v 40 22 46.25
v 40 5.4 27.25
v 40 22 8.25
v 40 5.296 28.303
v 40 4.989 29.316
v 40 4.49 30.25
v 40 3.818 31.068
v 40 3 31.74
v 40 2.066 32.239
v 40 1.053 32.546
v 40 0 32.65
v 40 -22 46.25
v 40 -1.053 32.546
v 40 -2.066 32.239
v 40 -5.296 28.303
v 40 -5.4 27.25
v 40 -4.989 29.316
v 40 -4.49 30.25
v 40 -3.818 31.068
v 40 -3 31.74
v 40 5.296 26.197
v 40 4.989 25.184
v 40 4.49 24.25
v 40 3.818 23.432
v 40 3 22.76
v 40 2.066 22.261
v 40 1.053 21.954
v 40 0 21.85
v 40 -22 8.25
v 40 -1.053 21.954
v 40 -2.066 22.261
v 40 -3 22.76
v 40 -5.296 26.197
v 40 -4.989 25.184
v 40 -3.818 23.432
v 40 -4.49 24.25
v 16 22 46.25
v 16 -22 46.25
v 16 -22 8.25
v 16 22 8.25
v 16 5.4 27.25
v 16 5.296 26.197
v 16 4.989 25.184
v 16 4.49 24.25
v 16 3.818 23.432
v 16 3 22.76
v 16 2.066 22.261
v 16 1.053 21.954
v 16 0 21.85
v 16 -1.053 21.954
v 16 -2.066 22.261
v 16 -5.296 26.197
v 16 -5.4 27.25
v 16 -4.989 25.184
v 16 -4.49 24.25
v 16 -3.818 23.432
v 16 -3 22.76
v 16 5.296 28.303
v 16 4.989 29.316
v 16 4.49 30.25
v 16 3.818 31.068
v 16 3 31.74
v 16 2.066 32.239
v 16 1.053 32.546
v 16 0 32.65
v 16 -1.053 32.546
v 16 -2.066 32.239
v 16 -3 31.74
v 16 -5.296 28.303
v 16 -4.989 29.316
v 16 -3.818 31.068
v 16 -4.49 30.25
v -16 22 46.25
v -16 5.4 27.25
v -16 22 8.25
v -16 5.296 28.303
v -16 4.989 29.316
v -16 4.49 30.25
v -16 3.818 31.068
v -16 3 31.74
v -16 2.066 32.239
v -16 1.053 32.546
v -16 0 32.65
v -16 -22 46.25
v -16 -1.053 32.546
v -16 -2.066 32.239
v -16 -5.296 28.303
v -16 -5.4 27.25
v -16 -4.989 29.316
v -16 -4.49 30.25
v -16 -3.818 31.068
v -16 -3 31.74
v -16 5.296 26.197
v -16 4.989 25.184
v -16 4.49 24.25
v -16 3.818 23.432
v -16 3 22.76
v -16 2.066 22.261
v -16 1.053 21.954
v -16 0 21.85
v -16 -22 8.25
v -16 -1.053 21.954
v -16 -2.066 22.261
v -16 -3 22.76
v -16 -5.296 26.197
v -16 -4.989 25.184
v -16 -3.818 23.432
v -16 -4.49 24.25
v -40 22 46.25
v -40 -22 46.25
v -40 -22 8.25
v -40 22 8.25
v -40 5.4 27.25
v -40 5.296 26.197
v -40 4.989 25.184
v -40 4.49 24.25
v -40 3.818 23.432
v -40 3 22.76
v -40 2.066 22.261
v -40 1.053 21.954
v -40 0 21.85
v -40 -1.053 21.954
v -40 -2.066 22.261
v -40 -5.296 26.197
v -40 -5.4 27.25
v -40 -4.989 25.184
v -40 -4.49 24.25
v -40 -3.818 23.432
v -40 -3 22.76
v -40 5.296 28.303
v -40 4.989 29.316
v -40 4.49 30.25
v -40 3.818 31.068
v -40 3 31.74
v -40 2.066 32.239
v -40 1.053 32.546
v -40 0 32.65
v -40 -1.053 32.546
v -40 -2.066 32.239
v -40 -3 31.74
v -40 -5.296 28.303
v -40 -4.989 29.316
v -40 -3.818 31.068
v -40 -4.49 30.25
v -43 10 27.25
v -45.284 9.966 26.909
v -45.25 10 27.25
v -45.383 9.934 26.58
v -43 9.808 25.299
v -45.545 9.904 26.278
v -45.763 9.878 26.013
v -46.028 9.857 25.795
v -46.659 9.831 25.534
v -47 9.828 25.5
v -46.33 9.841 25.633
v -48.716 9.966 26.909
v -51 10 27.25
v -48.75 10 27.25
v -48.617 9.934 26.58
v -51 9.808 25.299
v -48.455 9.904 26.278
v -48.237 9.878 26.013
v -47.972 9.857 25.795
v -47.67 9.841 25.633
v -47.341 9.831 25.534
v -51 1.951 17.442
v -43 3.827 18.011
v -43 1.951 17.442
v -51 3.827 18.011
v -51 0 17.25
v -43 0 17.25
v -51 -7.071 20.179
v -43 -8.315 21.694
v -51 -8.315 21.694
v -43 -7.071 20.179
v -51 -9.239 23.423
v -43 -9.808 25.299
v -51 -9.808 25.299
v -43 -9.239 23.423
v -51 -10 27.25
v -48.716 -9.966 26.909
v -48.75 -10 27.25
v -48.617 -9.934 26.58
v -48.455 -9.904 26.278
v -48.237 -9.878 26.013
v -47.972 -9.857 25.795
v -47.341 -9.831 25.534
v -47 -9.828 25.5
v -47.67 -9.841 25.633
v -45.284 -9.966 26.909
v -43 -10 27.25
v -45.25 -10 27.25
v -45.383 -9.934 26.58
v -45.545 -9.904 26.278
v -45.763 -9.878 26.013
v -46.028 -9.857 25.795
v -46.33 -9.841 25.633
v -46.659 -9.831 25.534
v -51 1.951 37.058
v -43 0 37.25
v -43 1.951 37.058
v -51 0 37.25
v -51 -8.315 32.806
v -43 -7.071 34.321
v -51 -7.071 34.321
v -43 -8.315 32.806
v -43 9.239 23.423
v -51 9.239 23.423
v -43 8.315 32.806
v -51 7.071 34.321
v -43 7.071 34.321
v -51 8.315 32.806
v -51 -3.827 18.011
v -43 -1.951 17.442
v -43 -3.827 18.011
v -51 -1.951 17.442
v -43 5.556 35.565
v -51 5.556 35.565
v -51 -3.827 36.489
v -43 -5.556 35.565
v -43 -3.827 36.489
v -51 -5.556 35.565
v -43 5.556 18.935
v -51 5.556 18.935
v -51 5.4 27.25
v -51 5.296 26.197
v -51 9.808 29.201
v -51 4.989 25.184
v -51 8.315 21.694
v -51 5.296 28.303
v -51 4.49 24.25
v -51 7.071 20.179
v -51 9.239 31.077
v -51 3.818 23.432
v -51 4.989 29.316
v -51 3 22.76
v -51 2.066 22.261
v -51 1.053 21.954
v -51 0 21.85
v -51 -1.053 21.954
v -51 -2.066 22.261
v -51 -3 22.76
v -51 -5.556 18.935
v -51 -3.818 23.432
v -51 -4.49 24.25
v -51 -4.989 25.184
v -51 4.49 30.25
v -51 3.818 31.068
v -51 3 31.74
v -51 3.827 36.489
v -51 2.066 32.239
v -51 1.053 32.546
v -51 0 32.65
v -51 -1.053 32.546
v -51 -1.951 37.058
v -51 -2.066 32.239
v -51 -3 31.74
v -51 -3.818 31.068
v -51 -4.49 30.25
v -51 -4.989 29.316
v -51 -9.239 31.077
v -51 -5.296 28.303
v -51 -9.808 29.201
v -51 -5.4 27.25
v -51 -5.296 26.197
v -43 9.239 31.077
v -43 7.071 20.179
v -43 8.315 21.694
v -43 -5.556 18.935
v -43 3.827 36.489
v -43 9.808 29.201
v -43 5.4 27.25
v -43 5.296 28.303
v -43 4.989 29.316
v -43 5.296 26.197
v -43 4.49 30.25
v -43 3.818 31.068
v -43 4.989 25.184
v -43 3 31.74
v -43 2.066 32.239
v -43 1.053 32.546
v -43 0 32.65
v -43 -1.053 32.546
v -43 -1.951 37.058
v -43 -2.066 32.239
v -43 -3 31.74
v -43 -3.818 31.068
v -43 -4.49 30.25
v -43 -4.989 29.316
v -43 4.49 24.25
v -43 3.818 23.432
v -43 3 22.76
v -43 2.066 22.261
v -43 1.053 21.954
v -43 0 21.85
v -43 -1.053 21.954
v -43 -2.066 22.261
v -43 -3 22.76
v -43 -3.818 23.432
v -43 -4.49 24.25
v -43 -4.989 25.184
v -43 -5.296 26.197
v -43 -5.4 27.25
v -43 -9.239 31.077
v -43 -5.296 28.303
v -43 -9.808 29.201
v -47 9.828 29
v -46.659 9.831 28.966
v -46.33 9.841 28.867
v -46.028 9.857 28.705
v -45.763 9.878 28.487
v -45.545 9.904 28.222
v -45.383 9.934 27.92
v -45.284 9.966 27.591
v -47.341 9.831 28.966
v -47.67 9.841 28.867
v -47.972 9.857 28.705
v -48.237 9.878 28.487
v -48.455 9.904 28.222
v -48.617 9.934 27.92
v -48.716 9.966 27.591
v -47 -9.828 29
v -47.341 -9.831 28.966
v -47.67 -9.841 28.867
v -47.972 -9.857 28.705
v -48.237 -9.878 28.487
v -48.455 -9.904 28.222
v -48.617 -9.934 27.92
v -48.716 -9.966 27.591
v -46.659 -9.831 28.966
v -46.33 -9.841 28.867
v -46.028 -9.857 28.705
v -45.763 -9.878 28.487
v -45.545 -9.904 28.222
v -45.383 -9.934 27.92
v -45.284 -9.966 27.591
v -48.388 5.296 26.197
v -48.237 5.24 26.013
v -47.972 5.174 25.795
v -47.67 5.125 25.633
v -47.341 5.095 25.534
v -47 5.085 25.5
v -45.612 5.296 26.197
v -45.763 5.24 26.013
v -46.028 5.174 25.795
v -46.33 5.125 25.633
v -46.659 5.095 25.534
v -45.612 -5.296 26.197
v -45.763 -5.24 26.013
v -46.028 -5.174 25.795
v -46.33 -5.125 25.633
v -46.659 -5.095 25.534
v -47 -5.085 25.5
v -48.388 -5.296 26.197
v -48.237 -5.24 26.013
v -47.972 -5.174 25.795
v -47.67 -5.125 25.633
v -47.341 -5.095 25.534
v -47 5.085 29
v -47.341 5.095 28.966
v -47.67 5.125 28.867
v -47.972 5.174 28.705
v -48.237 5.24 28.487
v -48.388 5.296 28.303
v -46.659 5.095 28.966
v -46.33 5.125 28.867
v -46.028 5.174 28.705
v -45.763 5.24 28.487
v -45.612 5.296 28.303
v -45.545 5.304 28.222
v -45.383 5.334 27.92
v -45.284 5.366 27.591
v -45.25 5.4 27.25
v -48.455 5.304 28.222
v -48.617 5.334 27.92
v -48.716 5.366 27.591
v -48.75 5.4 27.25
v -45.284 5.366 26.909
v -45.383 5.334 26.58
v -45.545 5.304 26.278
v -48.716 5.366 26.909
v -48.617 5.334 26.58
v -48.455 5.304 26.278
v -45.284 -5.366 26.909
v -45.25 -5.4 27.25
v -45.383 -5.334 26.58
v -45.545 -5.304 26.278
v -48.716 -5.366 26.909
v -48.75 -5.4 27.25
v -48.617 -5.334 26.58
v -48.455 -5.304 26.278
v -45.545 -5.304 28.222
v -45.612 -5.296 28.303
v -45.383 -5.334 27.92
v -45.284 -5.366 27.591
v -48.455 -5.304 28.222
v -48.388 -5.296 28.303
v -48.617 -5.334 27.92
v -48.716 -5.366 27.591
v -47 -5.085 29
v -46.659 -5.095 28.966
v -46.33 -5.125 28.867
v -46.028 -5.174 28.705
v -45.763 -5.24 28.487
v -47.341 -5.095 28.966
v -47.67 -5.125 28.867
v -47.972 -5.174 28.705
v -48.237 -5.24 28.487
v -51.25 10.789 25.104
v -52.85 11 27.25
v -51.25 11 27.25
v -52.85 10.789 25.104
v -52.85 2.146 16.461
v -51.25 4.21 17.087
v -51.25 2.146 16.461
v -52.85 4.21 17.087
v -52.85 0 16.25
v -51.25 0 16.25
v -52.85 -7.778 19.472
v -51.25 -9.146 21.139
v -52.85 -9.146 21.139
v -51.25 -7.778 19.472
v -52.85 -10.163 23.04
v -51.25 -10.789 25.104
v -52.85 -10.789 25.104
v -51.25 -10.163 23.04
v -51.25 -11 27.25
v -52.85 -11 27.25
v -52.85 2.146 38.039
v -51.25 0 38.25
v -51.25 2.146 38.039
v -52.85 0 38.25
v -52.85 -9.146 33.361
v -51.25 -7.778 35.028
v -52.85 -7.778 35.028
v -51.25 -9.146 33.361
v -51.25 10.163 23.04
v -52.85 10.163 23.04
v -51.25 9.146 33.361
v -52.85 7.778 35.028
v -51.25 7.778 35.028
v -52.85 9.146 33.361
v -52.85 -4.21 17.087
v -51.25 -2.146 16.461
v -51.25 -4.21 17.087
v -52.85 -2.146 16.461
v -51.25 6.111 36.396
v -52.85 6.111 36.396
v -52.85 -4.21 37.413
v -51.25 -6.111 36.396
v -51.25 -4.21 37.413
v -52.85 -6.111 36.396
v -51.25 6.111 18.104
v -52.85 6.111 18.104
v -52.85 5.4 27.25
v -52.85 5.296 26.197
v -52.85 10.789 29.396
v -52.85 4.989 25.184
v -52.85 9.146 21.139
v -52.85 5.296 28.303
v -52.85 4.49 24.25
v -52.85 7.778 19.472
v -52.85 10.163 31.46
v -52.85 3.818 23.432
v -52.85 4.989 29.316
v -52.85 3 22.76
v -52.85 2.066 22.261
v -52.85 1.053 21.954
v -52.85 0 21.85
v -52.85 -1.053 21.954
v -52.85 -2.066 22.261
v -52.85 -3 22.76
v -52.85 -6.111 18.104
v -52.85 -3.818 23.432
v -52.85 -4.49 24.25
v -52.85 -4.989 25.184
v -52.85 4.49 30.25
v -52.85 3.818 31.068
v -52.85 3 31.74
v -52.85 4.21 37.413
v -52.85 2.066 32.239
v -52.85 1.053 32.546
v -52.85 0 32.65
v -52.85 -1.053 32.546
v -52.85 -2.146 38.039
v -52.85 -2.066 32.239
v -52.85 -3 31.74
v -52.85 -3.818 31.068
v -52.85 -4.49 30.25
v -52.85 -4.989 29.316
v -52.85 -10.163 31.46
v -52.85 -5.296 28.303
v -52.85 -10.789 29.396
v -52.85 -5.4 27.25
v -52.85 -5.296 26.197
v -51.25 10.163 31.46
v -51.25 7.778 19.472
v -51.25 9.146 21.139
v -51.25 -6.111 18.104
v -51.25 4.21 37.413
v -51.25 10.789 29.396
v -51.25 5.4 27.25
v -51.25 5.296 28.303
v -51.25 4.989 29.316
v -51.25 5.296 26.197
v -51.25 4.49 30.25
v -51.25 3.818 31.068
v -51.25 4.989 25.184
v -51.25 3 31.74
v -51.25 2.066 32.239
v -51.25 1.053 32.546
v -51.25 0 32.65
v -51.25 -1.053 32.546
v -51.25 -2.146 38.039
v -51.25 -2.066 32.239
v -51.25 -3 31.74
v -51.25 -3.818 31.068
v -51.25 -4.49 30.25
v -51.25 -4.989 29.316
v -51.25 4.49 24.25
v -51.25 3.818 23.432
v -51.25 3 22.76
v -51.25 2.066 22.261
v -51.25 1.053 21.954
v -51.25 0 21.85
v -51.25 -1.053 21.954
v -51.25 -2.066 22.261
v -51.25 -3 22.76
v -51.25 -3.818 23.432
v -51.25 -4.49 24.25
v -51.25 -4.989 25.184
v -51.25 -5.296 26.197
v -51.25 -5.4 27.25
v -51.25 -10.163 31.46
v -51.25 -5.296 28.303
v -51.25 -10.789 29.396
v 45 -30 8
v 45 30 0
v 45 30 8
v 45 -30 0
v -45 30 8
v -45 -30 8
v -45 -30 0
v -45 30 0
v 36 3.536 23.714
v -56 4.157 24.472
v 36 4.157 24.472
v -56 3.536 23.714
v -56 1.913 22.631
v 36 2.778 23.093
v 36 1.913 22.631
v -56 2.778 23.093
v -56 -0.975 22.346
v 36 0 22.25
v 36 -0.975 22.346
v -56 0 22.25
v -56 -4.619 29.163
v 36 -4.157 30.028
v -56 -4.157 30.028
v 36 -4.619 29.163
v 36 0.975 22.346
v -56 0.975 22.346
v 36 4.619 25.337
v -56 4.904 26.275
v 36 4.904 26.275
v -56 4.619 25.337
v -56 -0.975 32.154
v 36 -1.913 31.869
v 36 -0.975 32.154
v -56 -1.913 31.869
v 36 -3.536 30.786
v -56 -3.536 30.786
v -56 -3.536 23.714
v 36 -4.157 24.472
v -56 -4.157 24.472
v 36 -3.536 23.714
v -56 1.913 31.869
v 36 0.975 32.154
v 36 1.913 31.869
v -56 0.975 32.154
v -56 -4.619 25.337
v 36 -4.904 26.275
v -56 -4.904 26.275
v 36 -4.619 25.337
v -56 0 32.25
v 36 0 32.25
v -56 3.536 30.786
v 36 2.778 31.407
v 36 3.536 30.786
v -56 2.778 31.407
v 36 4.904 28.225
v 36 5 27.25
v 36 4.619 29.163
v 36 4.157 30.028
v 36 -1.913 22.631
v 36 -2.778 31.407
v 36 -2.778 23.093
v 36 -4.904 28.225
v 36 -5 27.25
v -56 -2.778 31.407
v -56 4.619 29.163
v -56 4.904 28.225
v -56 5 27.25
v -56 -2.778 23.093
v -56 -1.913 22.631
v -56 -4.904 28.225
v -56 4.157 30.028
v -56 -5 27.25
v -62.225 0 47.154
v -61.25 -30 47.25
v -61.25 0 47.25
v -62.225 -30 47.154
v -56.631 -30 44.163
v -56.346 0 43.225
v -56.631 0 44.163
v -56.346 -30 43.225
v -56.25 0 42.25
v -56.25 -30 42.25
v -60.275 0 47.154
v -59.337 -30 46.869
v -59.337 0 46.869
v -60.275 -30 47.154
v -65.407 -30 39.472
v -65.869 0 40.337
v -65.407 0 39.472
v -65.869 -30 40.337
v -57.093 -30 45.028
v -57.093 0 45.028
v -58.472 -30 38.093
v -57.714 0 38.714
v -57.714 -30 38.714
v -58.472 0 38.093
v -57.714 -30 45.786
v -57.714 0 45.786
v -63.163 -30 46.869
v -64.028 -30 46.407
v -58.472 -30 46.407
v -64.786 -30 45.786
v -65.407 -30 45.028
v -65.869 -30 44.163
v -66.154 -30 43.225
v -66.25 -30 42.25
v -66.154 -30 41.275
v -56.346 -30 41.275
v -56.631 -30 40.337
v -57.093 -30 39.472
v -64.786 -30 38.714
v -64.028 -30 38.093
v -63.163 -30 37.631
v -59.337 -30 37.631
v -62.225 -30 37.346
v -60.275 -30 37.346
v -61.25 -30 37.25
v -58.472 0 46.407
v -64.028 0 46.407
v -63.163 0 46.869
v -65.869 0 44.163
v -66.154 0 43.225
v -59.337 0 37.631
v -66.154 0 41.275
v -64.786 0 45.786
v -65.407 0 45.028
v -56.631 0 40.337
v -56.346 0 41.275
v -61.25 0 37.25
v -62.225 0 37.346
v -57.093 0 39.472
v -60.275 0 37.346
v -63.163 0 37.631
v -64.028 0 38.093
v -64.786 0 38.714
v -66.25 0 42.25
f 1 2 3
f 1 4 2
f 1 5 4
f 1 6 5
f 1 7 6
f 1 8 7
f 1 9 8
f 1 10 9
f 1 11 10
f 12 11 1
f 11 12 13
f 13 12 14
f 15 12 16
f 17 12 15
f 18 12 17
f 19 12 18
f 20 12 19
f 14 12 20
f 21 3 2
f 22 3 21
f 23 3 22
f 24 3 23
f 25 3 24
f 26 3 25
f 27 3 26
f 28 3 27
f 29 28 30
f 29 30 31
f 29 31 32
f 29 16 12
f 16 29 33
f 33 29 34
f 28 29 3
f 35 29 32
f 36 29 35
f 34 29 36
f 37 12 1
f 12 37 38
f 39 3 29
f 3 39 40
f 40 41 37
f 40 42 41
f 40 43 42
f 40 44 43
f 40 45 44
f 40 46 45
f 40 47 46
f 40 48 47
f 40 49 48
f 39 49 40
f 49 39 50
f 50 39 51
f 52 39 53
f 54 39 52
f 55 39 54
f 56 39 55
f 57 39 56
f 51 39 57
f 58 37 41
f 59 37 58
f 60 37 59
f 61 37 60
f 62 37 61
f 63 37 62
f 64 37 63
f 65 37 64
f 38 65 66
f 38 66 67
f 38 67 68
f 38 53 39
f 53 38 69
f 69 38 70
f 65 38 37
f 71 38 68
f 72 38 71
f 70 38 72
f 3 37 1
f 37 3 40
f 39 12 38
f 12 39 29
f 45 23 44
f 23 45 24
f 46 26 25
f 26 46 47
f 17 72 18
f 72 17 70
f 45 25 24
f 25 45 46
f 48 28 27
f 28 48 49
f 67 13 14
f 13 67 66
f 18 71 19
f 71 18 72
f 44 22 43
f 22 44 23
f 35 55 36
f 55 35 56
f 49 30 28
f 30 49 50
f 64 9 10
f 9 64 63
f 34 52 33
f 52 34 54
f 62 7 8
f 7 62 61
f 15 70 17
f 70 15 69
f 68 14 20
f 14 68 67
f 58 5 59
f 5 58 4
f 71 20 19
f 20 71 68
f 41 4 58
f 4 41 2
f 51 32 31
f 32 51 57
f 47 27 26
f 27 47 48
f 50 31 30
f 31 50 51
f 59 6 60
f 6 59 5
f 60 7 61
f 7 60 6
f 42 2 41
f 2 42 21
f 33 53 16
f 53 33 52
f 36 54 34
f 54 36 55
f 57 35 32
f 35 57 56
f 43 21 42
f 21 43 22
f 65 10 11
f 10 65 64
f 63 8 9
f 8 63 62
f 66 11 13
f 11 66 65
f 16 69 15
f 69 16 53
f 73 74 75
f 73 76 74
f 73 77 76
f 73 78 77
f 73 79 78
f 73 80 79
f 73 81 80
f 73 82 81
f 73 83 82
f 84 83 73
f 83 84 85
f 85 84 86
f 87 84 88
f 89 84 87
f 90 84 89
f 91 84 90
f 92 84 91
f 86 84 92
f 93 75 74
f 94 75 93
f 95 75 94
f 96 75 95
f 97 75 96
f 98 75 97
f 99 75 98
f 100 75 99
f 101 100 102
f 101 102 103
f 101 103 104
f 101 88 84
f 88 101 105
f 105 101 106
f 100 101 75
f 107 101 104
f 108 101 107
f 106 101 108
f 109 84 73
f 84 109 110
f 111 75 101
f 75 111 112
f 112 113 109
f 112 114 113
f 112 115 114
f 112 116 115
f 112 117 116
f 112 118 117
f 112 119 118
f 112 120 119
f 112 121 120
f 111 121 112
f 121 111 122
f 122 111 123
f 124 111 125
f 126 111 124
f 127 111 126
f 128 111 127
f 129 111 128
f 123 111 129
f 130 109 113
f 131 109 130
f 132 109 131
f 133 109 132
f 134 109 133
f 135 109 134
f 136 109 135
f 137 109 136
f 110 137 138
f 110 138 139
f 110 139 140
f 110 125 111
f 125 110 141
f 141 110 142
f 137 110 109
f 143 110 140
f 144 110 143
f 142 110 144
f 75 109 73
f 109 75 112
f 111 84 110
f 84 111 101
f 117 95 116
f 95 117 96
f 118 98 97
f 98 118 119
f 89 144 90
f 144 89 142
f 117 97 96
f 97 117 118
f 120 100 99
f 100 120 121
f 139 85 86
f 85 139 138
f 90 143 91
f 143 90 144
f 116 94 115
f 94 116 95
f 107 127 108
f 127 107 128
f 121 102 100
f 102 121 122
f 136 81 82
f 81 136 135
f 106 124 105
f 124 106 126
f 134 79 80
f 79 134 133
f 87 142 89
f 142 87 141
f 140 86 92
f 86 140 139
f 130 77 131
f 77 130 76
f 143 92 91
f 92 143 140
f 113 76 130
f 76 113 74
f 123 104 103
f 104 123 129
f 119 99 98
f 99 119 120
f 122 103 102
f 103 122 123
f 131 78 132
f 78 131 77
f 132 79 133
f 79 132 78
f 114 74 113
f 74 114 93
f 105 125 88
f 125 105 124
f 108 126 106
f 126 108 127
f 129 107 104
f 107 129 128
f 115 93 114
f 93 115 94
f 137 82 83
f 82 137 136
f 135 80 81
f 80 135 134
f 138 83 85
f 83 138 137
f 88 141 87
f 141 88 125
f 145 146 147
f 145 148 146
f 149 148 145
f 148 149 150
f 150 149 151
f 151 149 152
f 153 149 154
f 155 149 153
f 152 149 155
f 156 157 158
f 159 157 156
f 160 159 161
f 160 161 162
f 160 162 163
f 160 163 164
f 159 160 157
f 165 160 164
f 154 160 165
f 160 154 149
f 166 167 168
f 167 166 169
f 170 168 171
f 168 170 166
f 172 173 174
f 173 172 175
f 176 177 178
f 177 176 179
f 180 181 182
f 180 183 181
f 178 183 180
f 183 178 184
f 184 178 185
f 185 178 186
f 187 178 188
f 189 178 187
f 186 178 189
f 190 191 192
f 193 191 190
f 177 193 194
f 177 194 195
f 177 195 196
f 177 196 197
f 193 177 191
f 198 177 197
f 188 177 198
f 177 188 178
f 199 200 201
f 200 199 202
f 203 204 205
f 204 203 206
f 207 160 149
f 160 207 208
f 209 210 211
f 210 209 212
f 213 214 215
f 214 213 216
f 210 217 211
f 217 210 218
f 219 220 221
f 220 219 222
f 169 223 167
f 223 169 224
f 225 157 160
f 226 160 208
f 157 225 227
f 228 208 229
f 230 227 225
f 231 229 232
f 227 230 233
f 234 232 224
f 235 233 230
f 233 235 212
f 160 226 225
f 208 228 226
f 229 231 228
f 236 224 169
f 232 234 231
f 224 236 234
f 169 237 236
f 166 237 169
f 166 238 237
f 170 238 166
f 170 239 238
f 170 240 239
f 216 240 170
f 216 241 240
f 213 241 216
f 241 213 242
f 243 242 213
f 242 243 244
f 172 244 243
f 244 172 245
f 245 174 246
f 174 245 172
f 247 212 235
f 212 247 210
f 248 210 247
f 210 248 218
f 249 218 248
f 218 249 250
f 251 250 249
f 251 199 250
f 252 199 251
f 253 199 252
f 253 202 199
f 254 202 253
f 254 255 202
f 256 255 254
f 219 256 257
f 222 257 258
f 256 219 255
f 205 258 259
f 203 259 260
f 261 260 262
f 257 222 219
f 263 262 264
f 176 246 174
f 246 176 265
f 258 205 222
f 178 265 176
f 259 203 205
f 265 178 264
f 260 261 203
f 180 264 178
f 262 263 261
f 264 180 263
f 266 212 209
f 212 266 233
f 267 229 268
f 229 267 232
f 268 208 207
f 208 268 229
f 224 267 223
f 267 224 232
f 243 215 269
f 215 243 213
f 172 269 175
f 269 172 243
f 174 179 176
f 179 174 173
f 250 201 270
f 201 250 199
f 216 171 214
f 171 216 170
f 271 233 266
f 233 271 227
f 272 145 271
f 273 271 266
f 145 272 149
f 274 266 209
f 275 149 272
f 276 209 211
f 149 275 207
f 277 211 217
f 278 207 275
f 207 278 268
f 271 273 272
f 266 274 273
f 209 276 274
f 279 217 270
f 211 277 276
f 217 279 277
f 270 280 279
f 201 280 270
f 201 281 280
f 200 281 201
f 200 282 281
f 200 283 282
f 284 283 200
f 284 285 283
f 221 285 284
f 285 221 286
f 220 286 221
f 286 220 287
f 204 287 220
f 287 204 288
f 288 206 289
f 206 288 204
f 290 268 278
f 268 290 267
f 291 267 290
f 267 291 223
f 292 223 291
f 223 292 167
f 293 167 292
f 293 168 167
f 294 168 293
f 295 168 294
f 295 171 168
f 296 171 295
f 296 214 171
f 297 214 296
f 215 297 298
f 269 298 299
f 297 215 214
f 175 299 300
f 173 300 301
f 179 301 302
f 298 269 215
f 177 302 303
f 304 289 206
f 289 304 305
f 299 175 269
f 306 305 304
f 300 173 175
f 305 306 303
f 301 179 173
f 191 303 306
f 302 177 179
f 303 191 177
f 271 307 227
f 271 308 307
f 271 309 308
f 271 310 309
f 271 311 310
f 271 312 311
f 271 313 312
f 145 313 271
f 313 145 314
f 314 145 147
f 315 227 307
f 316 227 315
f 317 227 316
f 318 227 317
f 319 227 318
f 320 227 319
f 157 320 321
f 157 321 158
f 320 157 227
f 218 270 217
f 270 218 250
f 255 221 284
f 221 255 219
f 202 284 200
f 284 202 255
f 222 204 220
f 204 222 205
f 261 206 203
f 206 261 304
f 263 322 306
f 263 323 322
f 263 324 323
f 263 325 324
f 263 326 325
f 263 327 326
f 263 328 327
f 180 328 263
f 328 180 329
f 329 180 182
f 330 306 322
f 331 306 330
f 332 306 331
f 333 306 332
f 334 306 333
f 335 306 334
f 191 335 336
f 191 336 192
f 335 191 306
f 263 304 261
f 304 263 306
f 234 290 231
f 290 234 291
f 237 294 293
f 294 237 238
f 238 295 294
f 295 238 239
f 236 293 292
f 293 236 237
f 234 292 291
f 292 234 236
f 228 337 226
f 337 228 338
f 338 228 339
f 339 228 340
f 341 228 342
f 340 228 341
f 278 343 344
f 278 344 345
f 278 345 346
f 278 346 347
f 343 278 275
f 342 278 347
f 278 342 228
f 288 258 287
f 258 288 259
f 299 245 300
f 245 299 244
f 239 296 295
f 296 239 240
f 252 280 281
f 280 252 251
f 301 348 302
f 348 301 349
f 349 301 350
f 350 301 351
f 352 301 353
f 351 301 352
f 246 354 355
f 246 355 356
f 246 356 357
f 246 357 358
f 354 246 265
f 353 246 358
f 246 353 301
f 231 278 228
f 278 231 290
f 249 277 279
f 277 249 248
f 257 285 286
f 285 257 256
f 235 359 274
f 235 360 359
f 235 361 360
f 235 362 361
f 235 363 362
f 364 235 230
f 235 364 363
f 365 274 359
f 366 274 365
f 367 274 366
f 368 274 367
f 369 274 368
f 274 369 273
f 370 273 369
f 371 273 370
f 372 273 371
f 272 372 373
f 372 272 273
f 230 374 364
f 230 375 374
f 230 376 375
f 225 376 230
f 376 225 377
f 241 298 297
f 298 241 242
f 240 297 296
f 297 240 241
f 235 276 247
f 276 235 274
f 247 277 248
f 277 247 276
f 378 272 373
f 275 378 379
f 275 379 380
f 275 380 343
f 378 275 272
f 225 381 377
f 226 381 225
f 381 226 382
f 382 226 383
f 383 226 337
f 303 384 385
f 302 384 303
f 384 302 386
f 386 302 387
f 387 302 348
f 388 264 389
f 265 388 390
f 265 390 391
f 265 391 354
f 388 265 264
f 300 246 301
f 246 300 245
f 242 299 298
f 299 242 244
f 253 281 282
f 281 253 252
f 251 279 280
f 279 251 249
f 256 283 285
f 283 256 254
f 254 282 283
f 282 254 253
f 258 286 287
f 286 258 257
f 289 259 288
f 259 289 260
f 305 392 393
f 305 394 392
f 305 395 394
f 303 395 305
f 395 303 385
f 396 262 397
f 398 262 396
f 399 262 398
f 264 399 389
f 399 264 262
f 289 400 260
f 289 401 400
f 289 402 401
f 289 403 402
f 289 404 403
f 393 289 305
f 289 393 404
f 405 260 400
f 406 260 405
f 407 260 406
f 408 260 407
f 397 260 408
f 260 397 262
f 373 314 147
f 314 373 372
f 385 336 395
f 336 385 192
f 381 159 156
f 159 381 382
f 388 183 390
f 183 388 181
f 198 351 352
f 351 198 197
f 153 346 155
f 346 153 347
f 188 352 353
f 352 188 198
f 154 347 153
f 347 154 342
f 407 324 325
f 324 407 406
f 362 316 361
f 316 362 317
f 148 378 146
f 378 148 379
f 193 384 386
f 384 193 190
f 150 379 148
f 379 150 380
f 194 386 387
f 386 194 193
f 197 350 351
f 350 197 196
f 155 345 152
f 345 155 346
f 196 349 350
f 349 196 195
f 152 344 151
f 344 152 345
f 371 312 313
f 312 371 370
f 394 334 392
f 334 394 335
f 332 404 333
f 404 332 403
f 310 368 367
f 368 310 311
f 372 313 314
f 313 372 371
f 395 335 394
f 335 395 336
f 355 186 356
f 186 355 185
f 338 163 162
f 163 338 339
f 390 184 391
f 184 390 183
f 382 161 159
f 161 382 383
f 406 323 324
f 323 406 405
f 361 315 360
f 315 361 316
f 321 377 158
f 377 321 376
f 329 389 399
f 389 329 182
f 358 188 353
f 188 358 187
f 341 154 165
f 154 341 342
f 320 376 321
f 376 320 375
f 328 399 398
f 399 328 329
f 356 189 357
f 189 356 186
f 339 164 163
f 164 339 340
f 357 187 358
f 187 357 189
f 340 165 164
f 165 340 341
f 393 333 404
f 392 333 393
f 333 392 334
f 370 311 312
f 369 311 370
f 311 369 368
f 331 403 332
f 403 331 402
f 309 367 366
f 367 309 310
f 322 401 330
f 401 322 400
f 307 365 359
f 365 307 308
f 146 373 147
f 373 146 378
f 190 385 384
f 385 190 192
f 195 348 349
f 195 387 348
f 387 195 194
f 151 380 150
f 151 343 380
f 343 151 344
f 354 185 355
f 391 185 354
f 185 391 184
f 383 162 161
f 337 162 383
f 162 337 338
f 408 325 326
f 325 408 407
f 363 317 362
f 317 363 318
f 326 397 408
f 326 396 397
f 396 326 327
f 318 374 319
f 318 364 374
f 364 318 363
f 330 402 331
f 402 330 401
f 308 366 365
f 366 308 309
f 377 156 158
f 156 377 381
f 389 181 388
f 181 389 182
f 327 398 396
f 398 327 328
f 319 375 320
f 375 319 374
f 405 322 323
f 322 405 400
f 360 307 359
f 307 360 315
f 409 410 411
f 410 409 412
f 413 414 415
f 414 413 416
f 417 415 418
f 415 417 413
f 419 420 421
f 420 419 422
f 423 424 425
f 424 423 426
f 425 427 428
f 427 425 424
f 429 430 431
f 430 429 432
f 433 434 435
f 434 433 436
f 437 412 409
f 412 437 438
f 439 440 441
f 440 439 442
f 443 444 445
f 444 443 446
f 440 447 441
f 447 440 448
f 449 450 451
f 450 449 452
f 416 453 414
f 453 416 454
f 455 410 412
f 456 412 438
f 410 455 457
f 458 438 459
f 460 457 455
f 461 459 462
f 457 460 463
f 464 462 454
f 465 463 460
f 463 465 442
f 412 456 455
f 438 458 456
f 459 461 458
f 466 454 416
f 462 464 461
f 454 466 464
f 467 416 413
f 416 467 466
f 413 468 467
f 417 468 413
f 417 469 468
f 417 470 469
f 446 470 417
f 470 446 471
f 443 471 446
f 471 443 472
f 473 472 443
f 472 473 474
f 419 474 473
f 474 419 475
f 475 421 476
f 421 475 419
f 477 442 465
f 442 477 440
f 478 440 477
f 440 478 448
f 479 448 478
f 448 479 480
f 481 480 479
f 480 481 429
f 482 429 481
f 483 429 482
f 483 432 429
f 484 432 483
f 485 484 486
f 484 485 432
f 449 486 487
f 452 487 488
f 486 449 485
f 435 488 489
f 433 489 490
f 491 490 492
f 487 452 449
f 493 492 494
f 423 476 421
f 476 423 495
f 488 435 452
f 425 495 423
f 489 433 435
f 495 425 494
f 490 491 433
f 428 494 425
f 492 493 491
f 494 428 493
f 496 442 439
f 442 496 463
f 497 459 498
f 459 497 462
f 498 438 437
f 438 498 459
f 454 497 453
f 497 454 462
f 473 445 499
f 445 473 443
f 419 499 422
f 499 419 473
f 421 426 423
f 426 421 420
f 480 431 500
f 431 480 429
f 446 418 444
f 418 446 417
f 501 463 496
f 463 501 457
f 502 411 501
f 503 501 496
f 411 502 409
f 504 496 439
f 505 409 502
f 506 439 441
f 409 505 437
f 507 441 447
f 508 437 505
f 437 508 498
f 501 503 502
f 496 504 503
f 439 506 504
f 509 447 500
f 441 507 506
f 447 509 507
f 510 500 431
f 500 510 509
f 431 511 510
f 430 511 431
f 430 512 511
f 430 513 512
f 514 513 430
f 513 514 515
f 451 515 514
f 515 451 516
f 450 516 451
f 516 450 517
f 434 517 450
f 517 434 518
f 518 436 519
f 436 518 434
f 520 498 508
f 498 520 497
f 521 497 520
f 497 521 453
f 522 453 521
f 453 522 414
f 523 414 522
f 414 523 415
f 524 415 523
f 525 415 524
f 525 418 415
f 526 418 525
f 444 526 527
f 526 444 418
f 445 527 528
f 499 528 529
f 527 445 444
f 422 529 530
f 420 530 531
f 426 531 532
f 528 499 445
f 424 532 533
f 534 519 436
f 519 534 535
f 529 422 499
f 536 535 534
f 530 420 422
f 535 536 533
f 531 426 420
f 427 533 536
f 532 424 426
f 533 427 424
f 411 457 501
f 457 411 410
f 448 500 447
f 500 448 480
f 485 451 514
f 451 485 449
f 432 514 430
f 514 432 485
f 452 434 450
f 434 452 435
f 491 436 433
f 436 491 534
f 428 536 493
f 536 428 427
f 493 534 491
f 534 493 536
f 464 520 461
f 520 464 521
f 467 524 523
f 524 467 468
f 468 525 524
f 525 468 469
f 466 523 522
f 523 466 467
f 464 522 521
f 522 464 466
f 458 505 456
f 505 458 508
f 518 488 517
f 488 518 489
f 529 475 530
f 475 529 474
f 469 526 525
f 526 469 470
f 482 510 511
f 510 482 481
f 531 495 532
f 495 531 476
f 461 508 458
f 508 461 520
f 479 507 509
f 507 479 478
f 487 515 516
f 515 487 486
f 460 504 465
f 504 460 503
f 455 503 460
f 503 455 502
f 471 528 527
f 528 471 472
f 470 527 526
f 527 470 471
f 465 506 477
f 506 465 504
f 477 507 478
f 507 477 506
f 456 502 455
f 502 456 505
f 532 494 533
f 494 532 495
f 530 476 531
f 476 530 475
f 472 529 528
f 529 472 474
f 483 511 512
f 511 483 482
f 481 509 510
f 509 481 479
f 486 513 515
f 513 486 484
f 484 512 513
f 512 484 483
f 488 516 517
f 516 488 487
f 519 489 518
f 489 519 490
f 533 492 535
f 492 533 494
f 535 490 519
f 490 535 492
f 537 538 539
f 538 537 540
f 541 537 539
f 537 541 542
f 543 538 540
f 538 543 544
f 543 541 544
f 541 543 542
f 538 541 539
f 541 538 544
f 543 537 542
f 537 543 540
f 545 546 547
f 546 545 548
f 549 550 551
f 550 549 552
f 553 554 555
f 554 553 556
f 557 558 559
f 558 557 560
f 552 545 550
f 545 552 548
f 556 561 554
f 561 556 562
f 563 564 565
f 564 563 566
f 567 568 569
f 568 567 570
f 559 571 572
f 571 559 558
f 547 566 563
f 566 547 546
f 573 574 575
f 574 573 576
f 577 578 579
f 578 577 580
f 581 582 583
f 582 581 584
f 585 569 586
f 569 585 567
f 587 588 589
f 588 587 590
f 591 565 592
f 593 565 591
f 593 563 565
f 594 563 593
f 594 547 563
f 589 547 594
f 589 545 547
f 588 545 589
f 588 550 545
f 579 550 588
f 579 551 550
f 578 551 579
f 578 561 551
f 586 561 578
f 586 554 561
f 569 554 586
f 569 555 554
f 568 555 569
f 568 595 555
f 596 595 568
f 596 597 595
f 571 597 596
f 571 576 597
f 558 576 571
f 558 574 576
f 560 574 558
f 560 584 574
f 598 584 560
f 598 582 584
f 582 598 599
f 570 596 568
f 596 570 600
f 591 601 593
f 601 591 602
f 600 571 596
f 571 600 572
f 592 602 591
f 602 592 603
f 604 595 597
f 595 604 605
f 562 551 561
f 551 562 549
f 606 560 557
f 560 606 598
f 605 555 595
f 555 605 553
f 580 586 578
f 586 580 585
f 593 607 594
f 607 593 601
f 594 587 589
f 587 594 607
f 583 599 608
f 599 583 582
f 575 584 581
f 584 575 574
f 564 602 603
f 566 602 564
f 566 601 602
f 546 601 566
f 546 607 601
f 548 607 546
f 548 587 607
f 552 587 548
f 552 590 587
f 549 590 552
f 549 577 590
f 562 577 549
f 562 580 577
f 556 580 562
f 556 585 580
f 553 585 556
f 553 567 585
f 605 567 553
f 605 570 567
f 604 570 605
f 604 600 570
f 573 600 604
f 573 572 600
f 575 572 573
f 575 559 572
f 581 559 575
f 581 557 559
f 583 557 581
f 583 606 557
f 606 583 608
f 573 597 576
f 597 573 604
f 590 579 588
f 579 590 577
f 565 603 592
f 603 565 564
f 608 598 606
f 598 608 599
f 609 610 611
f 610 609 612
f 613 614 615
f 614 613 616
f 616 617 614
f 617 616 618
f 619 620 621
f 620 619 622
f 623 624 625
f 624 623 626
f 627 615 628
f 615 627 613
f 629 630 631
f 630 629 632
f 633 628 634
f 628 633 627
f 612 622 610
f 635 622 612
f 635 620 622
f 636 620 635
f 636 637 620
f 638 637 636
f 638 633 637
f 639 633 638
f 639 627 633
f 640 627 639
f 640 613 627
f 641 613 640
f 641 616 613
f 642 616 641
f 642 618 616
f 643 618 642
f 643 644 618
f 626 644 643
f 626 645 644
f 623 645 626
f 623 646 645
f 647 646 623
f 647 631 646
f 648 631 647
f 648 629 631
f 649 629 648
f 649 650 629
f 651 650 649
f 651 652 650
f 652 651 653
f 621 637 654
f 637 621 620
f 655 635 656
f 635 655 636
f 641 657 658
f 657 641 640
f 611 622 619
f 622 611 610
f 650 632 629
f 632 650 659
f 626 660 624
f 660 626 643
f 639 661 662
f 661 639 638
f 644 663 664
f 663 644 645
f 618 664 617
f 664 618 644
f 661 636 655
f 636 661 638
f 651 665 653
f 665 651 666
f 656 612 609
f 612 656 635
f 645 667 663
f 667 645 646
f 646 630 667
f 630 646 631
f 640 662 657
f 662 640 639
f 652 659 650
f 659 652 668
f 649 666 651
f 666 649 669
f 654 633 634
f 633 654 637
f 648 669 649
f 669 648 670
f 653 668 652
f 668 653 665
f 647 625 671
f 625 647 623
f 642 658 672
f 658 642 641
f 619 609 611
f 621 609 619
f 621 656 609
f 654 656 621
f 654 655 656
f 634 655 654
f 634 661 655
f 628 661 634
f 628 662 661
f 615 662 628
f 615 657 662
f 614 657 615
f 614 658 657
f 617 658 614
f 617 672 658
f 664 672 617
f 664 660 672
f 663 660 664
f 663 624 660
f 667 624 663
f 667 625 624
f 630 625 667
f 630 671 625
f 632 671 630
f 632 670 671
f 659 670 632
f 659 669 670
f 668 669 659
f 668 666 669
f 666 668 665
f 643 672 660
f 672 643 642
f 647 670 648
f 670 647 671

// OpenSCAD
$fn = 32;

// ------------------------------------------------------------------------
// Machine vise: screw d10, jaws 24 x 38 mm
// Every part is its own module, assembly() places every instance.
// ------------------------------------------------------------------------

// --- part 1 ---
module vise_bed() {
  difference() {
    translate([-45, -30, 0]) cube([90, 60, 8]);
  }
}

// --- part 2 ---
module vise_jaw() {
  difference() {
    translate([-12, -22, 0]) cube([24, 44, 38]);
    translate([0, 0, 19]) rotate([0, 90, 0]) cylinder(h = 26, d = 10.8, center = true);
  }
}

// --- part 3 ---
module vise_screw() {
  translate([0, 0, -46]) cylinder(h = 92, d = 10);
}

// --- part 4 ---
module screw_collar() {
  difference() {
    cylinder(h = 8, d = 20);
    translate([0, 0, -1]) cylinder(h = 10, d = 10.8);
    translate([0, 0, 4]) rotate([90, 0, 0]) cylinder(h = 22, d = 3.5, center = true);
  }
}

// --- part 5 ---
module screw_washer() {
  difference() {
      translate([0, 0, 0]) cylinder(h = 1.6, d = 22);
      translate([0, 0, -1]) cylinder(h = 3.6, d = 10.8);
    }
}

// --- part 6 ---
module vise_handle() {
  cylinder(h = 30, d = 10);
}

// --- assembly ---
module assembly() {
  color([0.80, 0.24, 0.20]) translate([0, 0, 0]) rotate([0, 0, 0]) vise_bed();
  color([0.20, 0.45, 0.75]) translate([28, 0, 8.25]) rotate([0, 0, 0]) vise_jaw();
  color([0.25, 0.62, 0.32]) translate([-28, 0, 8.25]) rotate([0, 0, 0]) vise_jaw();
  color([0.92, 0.70, 0.18]) translate([-10, 0, 27.25]) rotate([0, 90, 0]) vise_screw();
  color([0.58, 0.35, 0.70]) translate([-51, 0, 27.25]) rotate([0, 90, 0]) screw_collar();
  color([0.16, 0.66, 0.66]) translate([-52.85, 0, 27.25]) rotate([0, 90, 0]) screw_washer();
  color([0.85, 0.48, 0.18]) translate([-61.25, 0, 42.25]) rotate([90, 0, 0]) vise_handle();
}

assembly();
